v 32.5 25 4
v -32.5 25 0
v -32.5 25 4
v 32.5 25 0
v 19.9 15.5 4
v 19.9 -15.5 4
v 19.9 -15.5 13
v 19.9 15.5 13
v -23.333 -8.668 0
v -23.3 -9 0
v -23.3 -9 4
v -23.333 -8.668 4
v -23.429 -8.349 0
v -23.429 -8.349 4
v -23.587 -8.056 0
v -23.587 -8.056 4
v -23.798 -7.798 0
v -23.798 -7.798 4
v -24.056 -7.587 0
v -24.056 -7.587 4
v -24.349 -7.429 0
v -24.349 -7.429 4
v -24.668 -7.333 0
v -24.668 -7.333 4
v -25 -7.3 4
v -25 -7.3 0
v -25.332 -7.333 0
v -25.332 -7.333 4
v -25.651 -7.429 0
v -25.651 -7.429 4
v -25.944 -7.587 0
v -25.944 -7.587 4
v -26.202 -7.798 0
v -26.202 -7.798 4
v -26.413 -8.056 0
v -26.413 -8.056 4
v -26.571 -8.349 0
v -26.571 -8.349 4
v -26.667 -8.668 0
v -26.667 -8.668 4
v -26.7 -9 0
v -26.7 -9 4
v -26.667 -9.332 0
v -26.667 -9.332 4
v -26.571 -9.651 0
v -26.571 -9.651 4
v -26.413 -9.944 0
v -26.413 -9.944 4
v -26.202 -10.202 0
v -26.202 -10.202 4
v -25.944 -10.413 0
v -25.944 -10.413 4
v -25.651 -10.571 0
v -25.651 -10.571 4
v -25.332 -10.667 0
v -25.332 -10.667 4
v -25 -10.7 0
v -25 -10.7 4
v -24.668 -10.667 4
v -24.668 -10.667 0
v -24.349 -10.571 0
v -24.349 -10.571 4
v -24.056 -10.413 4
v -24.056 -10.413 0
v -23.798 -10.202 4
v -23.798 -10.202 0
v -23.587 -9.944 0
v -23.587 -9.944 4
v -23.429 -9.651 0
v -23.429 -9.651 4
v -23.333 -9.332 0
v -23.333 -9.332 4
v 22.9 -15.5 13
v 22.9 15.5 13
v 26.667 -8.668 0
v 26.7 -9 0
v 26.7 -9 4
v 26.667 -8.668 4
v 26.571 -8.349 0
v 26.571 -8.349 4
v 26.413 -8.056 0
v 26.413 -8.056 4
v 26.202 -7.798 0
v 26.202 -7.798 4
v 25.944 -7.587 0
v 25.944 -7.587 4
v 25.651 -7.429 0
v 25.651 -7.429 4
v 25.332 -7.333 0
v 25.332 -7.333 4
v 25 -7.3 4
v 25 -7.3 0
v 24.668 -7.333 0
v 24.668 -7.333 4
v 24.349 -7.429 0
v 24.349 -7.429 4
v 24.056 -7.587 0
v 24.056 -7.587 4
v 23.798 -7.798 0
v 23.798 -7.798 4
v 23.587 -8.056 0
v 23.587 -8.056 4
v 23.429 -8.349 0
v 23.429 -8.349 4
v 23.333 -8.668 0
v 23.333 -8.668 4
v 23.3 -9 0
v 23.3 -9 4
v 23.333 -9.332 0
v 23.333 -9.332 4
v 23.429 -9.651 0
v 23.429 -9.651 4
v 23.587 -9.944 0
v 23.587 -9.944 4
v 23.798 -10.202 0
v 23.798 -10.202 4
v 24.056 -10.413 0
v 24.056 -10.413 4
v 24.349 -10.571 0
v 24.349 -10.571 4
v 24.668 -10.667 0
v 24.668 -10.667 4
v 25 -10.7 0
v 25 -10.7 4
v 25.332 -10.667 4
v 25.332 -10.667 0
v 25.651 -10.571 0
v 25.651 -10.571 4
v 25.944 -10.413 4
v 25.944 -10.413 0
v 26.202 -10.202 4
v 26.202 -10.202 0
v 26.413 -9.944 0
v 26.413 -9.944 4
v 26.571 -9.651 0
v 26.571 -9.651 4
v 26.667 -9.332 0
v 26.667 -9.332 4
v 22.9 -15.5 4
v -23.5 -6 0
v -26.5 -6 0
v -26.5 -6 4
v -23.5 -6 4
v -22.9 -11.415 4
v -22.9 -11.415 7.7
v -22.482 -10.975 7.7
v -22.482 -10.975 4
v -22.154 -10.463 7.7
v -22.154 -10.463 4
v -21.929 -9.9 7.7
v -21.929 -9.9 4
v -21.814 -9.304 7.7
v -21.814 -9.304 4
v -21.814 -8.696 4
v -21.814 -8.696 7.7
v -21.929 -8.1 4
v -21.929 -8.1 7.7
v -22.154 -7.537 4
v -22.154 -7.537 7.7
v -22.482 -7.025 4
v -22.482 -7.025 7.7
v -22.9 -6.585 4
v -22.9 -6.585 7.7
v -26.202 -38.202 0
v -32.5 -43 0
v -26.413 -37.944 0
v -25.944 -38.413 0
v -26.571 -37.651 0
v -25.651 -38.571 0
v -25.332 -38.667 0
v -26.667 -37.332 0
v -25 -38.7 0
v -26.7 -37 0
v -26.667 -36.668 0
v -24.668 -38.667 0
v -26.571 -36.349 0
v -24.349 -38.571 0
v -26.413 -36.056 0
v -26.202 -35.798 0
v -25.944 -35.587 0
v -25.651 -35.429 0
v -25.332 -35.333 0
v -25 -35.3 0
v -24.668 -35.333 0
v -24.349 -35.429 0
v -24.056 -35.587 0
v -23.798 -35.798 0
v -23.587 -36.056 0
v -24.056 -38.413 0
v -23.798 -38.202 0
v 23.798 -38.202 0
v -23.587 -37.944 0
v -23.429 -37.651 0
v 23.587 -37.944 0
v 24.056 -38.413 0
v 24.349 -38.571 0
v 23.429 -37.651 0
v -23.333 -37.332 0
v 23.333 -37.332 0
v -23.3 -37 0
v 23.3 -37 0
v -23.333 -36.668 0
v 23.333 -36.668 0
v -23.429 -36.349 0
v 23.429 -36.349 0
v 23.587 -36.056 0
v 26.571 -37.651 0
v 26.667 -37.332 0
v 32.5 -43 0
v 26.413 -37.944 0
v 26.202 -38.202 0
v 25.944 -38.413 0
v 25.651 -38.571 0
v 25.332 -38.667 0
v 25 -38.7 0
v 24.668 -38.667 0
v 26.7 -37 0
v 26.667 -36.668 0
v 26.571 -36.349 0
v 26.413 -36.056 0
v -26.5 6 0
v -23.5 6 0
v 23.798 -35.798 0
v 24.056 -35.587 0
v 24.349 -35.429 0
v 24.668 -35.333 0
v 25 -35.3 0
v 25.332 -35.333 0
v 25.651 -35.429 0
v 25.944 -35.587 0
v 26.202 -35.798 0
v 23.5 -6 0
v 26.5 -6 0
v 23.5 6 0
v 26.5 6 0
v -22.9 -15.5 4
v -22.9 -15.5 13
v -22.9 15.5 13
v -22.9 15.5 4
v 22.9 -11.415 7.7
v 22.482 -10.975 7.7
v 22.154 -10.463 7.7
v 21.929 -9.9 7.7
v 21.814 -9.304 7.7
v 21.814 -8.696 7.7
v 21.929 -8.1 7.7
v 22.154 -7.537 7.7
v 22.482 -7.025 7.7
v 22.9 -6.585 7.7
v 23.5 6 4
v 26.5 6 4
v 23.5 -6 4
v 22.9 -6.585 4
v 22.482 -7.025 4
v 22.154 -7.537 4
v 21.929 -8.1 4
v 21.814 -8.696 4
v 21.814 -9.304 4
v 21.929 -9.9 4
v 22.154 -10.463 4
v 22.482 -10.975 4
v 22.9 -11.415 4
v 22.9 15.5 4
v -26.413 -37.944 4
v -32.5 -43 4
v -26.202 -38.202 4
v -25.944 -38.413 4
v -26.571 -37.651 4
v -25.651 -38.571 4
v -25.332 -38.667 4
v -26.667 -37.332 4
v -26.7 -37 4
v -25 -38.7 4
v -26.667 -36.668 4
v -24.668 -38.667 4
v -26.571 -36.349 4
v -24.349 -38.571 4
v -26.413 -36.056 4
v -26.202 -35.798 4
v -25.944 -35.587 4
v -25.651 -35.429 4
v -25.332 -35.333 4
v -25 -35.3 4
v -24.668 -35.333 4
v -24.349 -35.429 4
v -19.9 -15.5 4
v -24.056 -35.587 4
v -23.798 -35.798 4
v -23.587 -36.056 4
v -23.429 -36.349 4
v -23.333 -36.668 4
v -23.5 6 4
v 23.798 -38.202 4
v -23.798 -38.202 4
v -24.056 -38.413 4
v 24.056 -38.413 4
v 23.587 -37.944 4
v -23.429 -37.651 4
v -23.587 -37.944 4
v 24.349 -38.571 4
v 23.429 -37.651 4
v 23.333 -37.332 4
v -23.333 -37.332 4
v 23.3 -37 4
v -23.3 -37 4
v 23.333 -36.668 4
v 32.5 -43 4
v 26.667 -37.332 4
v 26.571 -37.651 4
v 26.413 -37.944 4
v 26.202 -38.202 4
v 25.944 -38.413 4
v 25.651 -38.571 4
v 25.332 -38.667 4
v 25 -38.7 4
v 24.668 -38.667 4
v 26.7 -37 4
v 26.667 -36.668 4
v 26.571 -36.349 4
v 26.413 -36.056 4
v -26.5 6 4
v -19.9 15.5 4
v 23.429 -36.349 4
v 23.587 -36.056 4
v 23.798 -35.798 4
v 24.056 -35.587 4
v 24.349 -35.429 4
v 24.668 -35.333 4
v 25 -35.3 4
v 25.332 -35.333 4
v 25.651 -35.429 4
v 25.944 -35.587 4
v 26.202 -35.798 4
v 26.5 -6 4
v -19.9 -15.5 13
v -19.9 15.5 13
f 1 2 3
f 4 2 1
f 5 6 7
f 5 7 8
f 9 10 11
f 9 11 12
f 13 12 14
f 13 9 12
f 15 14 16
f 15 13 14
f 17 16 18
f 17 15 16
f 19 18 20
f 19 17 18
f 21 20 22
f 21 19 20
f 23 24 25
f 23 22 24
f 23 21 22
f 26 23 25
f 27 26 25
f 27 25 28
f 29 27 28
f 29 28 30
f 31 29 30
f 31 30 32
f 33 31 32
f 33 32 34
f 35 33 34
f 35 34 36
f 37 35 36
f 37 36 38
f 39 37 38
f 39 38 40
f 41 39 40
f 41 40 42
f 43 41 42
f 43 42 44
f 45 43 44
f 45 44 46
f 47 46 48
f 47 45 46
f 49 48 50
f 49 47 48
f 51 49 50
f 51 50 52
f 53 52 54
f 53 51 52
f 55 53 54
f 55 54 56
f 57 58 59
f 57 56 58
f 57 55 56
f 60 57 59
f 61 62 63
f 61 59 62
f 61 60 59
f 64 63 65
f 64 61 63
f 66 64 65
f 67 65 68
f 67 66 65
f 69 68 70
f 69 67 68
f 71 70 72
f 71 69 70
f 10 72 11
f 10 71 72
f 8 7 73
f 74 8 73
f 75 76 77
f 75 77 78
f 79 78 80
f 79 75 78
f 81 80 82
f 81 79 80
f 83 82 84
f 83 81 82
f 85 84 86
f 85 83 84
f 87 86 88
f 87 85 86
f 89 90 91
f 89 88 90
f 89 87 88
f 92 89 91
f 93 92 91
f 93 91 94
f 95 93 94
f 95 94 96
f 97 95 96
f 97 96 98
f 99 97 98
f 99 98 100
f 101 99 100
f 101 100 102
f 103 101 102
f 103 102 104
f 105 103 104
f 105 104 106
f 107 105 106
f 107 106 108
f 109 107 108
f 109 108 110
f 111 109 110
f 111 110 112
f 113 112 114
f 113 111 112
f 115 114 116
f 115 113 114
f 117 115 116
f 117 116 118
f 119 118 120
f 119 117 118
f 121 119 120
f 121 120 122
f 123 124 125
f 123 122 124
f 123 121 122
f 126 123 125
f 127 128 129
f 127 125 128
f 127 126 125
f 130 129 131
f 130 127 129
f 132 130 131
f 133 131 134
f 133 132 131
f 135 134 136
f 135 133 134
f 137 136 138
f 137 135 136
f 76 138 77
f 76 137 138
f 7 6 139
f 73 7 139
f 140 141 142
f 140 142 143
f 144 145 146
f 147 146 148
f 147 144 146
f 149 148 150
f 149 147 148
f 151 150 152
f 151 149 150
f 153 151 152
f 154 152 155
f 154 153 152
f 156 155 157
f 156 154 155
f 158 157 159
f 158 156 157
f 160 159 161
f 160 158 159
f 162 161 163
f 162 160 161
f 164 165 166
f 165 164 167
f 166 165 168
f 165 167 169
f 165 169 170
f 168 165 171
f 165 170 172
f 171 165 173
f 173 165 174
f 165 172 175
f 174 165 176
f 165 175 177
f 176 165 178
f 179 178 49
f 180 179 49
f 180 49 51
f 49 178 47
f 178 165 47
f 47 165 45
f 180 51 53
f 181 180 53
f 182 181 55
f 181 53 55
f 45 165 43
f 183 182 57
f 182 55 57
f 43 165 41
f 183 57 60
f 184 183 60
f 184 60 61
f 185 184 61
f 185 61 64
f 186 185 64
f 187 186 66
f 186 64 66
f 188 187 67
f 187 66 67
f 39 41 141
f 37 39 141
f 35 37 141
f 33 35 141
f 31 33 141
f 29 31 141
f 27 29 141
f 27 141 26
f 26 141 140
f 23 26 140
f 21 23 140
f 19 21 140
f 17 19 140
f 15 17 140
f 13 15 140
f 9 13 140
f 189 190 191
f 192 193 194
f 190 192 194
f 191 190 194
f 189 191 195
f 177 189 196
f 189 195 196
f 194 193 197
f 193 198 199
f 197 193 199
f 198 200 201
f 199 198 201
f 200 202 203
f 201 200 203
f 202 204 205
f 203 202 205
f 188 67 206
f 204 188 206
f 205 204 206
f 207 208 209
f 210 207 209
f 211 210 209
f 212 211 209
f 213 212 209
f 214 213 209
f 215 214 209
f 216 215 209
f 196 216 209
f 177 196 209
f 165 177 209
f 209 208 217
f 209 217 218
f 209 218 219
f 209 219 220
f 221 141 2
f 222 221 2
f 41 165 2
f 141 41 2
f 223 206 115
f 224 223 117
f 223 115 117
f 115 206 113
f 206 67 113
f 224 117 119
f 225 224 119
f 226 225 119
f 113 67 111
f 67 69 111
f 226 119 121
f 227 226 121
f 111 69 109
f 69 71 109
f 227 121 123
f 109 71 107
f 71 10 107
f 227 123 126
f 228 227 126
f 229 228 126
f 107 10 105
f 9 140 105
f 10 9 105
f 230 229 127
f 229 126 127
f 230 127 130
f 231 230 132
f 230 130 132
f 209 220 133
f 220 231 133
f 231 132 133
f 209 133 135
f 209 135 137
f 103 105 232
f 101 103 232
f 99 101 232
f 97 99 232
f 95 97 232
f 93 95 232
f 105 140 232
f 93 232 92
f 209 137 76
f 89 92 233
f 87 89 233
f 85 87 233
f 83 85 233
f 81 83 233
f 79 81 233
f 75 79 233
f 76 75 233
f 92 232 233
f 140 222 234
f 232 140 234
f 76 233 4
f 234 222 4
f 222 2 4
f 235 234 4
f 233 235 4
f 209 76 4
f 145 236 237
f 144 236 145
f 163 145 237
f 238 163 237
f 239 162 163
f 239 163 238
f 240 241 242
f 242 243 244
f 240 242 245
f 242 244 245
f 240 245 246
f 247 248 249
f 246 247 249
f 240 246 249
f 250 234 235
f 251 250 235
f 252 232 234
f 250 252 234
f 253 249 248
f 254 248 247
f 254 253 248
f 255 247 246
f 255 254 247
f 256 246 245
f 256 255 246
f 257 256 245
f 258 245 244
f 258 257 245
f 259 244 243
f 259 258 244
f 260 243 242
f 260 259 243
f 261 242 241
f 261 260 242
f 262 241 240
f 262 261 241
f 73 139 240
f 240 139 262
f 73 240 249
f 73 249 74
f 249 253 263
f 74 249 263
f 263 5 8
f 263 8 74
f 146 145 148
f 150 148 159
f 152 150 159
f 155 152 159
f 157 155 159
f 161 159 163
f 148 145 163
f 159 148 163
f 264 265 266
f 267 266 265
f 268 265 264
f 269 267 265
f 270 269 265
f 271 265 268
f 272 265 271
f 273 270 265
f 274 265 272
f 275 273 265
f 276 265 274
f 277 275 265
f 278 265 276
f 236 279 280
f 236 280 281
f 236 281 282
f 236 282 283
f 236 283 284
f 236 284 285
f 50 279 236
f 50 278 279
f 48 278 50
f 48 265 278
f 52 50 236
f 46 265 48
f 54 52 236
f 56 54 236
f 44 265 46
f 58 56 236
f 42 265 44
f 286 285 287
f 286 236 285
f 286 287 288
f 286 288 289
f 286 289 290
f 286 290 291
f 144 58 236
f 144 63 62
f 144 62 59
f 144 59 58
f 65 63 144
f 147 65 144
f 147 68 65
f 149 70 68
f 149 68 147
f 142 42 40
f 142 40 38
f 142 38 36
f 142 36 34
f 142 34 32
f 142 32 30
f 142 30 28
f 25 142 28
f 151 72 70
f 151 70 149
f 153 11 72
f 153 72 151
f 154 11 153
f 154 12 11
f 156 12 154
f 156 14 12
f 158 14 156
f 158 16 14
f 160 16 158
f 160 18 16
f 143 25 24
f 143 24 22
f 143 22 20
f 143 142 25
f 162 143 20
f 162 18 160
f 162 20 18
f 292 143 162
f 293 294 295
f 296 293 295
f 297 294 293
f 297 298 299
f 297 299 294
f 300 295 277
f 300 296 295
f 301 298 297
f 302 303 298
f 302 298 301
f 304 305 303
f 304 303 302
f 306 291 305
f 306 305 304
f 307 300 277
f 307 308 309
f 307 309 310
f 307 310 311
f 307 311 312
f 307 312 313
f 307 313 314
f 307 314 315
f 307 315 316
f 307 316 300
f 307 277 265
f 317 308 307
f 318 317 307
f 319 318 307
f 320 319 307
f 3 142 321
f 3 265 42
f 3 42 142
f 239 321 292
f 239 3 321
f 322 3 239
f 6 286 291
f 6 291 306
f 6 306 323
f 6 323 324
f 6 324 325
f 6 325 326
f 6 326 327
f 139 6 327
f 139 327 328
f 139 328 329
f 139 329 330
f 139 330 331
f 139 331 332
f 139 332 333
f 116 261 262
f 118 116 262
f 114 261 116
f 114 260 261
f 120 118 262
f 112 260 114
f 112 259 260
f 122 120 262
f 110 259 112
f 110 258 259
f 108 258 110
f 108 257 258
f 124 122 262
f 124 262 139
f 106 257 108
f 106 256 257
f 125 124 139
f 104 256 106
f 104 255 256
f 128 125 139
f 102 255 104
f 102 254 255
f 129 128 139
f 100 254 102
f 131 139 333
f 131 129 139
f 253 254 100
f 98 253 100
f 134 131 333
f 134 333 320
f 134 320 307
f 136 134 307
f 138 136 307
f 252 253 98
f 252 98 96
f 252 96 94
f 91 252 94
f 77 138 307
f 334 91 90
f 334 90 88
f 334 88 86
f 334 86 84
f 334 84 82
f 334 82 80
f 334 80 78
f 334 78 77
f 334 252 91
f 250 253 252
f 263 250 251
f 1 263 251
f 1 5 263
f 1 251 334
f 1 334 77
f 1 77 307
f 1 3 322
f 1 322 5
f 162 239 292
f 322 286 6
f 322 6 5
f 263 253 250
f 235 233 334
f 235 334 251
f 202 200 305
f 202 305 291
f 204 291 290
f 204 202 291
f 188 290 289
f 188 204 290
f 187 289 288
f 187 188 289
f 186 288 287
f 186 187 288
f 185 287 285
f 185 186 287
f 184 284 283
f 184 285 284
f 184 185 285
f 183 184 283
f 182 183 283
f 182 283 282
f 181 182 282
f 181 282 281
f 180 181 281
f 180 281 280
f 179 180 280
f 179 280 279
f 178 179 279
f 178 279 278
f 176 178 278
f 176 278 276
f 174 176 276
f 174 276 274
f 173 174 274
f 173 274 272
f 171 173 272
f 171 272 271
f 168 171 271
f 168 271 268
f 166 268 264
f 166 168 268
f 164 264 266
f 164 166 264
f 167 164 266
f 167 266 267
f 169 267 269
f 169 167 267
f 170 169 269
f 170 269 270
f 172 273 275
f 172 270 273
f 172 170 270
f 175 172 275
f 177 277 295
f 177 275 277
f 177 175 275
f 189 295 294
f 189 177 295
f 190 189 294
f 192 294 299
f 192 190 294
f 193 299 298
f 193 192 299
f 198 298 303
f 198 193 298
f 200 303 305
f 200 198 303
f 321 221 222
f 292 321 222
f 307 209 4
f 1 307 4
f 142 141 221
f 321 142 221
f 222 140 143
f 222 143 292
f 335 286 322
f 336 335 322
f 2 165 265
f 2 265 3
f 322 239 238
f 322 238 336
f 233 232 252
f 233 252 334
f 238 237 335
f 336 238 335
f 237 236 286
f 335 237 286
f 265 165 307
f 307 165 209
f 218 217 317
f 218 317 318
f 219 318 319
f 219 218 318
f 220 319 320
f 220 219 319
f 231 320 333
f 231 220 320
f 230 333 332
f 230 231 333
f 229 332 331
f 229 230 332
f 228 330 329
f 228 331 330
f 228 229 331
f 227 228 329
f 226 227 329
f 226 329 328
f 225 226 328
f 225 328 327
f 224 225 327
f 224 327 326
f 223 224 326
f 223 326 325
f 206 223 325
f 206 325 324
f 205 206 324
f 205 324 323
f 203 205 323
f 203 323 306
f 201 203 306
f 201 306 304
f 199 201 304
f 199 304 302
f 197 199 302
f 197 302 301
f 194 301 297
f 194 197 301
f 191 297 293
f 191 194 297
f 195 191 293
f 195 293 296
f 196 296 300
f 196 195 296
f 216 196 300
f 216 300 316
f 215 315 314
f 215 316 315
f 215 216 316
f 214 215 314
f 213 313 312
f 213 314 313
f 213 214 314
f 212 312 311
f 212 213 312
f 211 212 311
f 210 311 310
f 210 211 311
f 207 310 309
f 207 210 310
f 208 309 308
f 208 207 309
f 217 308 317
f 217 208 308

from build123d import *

# Parameters (mm, degrees)
SKETCH_RADAR_SEAT_W             = 65
SKETCH_RADAR_SEAT_H             = 68
RADAR_SEAT_DEPTH                = 4
LATERAL_STOPS_START             = 4
SKETCH_LATERAL_STOPS_W          = 3
SKETCH_LATERAL_STOPS_H          = 31
LATERAL_STOPS_DEPTH             = 9
POST_M3_START                   = -1
SKETCH_POST_M3_R                = 1.7
POST_M3_DEPTH                   = 7
TOP_SCREW_HEAD_RELIEFS_START    = 4
SKETCH_TOP_SCREW_HEAD_RELIEFS_R = 3.2
TOP_SCREW_HEAD_RELIEFS_DEPTH    = 3.7
RETENTION_STRAP_SLOTS_START     = -1
SKETCH_RETENTION_STRAP_SLOTS_W  = 3
SKETCH_RETENTION_STRAP_SLOTS_H  = 12
RETENTION_STRAP_SLOTS_DEPTH     = 7


with BuildPart() as part:
    # Sketch_Radar_seat → Radar_seat (new body)
    with BuildSketch(Plane.XY):
        with Locations((0, -9)):
            Rectangle(SKETCH_RADAR_SEAT_W, SKETCH_RADAR_SEAT_H)
    extrude(amount=RADAR_SEAT_DEPTH)

    # Sketch_Lateral_stops → Lateral_stops (add)
    with BuildSketch(Plane.XY.offset(LATERAL_STOPS_START)):
        with Locations((-21.4, 0)):
            Rectangle(SKETCH_LATERAL_STOPS_W, SKETCH_LATERAL_STOPS_H)
        with Locations((21.4, 0)):
            Rectangle(SKETCH_LATERAL_STOPS_W, SKETCH_LATERAL_STOPS_H)
    extrude(amount=LATERAL_STOPS_DEPTH)

    # Sketch_Post_M3 → Post_M3 (cut)
    with BuildSketch(Plane.XY.offset(POST_M3_START)):
        with Locations((-25, -37)):
            Circle(SKETCH_POST_M3_R)
        with Locations((-25, -9)):
            Circle(SKETCH_POST_M3_R)
        with Locations((25, -37)):
            Circle(SKETCH_POST_M3_R)
        with Locations((25, -9)):
            Circle(SKETCH_POST_M3_R)
    extrude(amount=POST_M3_DEPTH, mode=Mode.SUBTRACT)

    # Sketch_Top_screw_head_reliefs → Top_screw_head_reliefs (cut)
    with BuildSketch(Plane.XY.offset(TOP_SCREW_HEAD_RELIEFS_START)):
        with Locations((-25, -9)):
            Circle(SKETCH_TOP_SCREW_HEAD_RELIEFS_R)
        with Locations((25, -9)):
            Circle(SKETCH_TOP_SCREW_HEAD_RELIEFS_R)
    extrude(amount=TOP_SCREW_HEAD_RELIEFS_DEPTH, mode=Mode.SUBTRACT)

    # Sketch_Retention_strap_slots → Retention_strap_slots (cut)
    with BuildSketch(Plane.XY.offset(RETENTION_STRAP_SLOTS_START)):
        with Locations((-25, 0)):
            Rectangle(SKETCH_RETENTION_STRAP_SLOTS_W, SKETCH_RETENTION_STRAP_SLOTS_H)
        with Locations((25, 0)):
            Rectangle(SKETCH_RETENTION_STRAP_SLOTS_W, SKETCH_RETENTION_STRAP_SLOTS_H)
    extrude(amount=RETENTION_STRAP_SLOTS_DEPTH, mode=Mode.SUBTRACT)


solid = part.part
